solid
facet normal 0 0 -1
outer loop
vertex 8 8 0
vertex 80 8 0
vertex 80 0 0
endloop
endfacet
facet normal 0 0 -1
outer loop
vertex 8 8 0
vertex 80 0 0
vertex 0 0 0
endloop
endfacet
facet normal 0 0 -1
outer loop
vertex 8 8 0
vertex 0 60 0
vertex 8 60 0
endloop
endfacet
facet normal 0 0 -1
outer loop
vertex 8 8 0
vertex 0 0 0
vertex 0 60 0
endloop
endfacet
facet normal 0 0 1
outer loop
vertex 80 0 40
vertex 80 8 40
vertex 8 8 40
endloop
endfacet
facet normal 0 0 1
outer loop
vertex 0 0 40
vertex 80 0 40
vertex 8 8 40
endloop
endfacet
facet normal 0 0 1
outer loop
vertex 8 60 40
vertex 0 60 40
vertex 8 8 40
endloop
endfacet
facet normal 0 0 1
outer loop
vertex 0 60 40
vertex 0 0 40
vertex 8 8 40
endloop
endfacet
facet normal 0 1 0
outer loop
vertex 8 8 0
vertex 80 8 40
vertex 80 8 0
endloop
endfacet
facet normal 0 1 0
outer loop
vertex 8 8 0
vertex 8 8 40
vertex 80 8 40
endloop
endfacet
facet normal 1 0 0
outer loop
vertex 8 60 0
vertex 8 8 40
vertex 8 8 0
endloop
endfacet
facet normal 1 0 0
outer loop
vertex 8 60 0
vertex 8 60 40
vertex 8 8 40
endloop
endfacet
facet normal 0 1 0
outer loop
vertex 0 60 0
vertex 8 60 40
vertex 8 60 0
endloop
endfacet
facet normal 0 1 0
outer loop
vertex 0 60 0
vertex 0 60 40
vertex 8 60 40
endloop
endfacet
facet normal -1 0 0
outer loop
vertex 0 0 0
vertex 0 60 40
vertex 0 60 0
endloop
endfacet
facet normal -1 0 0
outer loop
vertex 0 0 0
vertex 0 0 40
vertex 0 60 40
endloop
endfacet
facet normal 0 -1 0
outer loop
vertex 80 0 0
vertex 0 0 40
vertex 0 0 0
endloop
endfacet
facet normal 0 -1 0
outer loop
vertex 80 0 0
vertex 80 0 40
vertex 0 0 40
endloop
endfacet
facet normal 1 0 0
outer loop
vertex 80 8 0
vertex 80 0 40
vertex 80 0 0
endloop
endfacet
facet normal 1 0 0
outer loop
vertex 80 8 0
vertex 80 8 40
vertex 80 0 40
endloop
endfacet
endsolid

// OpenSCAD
$fn = 32;

// ----------------------------------------------------------------------
// Structural section: angle 80 x 60 mm
// ----------------------------------------------------------------------

// --- parameters (mm) ---
sec_w = 80;               // leg width, X
sec_h = 60;               // leg height, Y
flange_t = 8;             // leg thickness
plate_t = 40;             // cut length, Z (extrusion height)

profile = [[0, 0], [80, 0], [80, 8], [8, 8], [8, 60], [0, 60]];  // primary outline, 6 points, counter clockwise

// --- the one profile operation ---
linear_extrude(height = plate_t) polygon(points = profile);
